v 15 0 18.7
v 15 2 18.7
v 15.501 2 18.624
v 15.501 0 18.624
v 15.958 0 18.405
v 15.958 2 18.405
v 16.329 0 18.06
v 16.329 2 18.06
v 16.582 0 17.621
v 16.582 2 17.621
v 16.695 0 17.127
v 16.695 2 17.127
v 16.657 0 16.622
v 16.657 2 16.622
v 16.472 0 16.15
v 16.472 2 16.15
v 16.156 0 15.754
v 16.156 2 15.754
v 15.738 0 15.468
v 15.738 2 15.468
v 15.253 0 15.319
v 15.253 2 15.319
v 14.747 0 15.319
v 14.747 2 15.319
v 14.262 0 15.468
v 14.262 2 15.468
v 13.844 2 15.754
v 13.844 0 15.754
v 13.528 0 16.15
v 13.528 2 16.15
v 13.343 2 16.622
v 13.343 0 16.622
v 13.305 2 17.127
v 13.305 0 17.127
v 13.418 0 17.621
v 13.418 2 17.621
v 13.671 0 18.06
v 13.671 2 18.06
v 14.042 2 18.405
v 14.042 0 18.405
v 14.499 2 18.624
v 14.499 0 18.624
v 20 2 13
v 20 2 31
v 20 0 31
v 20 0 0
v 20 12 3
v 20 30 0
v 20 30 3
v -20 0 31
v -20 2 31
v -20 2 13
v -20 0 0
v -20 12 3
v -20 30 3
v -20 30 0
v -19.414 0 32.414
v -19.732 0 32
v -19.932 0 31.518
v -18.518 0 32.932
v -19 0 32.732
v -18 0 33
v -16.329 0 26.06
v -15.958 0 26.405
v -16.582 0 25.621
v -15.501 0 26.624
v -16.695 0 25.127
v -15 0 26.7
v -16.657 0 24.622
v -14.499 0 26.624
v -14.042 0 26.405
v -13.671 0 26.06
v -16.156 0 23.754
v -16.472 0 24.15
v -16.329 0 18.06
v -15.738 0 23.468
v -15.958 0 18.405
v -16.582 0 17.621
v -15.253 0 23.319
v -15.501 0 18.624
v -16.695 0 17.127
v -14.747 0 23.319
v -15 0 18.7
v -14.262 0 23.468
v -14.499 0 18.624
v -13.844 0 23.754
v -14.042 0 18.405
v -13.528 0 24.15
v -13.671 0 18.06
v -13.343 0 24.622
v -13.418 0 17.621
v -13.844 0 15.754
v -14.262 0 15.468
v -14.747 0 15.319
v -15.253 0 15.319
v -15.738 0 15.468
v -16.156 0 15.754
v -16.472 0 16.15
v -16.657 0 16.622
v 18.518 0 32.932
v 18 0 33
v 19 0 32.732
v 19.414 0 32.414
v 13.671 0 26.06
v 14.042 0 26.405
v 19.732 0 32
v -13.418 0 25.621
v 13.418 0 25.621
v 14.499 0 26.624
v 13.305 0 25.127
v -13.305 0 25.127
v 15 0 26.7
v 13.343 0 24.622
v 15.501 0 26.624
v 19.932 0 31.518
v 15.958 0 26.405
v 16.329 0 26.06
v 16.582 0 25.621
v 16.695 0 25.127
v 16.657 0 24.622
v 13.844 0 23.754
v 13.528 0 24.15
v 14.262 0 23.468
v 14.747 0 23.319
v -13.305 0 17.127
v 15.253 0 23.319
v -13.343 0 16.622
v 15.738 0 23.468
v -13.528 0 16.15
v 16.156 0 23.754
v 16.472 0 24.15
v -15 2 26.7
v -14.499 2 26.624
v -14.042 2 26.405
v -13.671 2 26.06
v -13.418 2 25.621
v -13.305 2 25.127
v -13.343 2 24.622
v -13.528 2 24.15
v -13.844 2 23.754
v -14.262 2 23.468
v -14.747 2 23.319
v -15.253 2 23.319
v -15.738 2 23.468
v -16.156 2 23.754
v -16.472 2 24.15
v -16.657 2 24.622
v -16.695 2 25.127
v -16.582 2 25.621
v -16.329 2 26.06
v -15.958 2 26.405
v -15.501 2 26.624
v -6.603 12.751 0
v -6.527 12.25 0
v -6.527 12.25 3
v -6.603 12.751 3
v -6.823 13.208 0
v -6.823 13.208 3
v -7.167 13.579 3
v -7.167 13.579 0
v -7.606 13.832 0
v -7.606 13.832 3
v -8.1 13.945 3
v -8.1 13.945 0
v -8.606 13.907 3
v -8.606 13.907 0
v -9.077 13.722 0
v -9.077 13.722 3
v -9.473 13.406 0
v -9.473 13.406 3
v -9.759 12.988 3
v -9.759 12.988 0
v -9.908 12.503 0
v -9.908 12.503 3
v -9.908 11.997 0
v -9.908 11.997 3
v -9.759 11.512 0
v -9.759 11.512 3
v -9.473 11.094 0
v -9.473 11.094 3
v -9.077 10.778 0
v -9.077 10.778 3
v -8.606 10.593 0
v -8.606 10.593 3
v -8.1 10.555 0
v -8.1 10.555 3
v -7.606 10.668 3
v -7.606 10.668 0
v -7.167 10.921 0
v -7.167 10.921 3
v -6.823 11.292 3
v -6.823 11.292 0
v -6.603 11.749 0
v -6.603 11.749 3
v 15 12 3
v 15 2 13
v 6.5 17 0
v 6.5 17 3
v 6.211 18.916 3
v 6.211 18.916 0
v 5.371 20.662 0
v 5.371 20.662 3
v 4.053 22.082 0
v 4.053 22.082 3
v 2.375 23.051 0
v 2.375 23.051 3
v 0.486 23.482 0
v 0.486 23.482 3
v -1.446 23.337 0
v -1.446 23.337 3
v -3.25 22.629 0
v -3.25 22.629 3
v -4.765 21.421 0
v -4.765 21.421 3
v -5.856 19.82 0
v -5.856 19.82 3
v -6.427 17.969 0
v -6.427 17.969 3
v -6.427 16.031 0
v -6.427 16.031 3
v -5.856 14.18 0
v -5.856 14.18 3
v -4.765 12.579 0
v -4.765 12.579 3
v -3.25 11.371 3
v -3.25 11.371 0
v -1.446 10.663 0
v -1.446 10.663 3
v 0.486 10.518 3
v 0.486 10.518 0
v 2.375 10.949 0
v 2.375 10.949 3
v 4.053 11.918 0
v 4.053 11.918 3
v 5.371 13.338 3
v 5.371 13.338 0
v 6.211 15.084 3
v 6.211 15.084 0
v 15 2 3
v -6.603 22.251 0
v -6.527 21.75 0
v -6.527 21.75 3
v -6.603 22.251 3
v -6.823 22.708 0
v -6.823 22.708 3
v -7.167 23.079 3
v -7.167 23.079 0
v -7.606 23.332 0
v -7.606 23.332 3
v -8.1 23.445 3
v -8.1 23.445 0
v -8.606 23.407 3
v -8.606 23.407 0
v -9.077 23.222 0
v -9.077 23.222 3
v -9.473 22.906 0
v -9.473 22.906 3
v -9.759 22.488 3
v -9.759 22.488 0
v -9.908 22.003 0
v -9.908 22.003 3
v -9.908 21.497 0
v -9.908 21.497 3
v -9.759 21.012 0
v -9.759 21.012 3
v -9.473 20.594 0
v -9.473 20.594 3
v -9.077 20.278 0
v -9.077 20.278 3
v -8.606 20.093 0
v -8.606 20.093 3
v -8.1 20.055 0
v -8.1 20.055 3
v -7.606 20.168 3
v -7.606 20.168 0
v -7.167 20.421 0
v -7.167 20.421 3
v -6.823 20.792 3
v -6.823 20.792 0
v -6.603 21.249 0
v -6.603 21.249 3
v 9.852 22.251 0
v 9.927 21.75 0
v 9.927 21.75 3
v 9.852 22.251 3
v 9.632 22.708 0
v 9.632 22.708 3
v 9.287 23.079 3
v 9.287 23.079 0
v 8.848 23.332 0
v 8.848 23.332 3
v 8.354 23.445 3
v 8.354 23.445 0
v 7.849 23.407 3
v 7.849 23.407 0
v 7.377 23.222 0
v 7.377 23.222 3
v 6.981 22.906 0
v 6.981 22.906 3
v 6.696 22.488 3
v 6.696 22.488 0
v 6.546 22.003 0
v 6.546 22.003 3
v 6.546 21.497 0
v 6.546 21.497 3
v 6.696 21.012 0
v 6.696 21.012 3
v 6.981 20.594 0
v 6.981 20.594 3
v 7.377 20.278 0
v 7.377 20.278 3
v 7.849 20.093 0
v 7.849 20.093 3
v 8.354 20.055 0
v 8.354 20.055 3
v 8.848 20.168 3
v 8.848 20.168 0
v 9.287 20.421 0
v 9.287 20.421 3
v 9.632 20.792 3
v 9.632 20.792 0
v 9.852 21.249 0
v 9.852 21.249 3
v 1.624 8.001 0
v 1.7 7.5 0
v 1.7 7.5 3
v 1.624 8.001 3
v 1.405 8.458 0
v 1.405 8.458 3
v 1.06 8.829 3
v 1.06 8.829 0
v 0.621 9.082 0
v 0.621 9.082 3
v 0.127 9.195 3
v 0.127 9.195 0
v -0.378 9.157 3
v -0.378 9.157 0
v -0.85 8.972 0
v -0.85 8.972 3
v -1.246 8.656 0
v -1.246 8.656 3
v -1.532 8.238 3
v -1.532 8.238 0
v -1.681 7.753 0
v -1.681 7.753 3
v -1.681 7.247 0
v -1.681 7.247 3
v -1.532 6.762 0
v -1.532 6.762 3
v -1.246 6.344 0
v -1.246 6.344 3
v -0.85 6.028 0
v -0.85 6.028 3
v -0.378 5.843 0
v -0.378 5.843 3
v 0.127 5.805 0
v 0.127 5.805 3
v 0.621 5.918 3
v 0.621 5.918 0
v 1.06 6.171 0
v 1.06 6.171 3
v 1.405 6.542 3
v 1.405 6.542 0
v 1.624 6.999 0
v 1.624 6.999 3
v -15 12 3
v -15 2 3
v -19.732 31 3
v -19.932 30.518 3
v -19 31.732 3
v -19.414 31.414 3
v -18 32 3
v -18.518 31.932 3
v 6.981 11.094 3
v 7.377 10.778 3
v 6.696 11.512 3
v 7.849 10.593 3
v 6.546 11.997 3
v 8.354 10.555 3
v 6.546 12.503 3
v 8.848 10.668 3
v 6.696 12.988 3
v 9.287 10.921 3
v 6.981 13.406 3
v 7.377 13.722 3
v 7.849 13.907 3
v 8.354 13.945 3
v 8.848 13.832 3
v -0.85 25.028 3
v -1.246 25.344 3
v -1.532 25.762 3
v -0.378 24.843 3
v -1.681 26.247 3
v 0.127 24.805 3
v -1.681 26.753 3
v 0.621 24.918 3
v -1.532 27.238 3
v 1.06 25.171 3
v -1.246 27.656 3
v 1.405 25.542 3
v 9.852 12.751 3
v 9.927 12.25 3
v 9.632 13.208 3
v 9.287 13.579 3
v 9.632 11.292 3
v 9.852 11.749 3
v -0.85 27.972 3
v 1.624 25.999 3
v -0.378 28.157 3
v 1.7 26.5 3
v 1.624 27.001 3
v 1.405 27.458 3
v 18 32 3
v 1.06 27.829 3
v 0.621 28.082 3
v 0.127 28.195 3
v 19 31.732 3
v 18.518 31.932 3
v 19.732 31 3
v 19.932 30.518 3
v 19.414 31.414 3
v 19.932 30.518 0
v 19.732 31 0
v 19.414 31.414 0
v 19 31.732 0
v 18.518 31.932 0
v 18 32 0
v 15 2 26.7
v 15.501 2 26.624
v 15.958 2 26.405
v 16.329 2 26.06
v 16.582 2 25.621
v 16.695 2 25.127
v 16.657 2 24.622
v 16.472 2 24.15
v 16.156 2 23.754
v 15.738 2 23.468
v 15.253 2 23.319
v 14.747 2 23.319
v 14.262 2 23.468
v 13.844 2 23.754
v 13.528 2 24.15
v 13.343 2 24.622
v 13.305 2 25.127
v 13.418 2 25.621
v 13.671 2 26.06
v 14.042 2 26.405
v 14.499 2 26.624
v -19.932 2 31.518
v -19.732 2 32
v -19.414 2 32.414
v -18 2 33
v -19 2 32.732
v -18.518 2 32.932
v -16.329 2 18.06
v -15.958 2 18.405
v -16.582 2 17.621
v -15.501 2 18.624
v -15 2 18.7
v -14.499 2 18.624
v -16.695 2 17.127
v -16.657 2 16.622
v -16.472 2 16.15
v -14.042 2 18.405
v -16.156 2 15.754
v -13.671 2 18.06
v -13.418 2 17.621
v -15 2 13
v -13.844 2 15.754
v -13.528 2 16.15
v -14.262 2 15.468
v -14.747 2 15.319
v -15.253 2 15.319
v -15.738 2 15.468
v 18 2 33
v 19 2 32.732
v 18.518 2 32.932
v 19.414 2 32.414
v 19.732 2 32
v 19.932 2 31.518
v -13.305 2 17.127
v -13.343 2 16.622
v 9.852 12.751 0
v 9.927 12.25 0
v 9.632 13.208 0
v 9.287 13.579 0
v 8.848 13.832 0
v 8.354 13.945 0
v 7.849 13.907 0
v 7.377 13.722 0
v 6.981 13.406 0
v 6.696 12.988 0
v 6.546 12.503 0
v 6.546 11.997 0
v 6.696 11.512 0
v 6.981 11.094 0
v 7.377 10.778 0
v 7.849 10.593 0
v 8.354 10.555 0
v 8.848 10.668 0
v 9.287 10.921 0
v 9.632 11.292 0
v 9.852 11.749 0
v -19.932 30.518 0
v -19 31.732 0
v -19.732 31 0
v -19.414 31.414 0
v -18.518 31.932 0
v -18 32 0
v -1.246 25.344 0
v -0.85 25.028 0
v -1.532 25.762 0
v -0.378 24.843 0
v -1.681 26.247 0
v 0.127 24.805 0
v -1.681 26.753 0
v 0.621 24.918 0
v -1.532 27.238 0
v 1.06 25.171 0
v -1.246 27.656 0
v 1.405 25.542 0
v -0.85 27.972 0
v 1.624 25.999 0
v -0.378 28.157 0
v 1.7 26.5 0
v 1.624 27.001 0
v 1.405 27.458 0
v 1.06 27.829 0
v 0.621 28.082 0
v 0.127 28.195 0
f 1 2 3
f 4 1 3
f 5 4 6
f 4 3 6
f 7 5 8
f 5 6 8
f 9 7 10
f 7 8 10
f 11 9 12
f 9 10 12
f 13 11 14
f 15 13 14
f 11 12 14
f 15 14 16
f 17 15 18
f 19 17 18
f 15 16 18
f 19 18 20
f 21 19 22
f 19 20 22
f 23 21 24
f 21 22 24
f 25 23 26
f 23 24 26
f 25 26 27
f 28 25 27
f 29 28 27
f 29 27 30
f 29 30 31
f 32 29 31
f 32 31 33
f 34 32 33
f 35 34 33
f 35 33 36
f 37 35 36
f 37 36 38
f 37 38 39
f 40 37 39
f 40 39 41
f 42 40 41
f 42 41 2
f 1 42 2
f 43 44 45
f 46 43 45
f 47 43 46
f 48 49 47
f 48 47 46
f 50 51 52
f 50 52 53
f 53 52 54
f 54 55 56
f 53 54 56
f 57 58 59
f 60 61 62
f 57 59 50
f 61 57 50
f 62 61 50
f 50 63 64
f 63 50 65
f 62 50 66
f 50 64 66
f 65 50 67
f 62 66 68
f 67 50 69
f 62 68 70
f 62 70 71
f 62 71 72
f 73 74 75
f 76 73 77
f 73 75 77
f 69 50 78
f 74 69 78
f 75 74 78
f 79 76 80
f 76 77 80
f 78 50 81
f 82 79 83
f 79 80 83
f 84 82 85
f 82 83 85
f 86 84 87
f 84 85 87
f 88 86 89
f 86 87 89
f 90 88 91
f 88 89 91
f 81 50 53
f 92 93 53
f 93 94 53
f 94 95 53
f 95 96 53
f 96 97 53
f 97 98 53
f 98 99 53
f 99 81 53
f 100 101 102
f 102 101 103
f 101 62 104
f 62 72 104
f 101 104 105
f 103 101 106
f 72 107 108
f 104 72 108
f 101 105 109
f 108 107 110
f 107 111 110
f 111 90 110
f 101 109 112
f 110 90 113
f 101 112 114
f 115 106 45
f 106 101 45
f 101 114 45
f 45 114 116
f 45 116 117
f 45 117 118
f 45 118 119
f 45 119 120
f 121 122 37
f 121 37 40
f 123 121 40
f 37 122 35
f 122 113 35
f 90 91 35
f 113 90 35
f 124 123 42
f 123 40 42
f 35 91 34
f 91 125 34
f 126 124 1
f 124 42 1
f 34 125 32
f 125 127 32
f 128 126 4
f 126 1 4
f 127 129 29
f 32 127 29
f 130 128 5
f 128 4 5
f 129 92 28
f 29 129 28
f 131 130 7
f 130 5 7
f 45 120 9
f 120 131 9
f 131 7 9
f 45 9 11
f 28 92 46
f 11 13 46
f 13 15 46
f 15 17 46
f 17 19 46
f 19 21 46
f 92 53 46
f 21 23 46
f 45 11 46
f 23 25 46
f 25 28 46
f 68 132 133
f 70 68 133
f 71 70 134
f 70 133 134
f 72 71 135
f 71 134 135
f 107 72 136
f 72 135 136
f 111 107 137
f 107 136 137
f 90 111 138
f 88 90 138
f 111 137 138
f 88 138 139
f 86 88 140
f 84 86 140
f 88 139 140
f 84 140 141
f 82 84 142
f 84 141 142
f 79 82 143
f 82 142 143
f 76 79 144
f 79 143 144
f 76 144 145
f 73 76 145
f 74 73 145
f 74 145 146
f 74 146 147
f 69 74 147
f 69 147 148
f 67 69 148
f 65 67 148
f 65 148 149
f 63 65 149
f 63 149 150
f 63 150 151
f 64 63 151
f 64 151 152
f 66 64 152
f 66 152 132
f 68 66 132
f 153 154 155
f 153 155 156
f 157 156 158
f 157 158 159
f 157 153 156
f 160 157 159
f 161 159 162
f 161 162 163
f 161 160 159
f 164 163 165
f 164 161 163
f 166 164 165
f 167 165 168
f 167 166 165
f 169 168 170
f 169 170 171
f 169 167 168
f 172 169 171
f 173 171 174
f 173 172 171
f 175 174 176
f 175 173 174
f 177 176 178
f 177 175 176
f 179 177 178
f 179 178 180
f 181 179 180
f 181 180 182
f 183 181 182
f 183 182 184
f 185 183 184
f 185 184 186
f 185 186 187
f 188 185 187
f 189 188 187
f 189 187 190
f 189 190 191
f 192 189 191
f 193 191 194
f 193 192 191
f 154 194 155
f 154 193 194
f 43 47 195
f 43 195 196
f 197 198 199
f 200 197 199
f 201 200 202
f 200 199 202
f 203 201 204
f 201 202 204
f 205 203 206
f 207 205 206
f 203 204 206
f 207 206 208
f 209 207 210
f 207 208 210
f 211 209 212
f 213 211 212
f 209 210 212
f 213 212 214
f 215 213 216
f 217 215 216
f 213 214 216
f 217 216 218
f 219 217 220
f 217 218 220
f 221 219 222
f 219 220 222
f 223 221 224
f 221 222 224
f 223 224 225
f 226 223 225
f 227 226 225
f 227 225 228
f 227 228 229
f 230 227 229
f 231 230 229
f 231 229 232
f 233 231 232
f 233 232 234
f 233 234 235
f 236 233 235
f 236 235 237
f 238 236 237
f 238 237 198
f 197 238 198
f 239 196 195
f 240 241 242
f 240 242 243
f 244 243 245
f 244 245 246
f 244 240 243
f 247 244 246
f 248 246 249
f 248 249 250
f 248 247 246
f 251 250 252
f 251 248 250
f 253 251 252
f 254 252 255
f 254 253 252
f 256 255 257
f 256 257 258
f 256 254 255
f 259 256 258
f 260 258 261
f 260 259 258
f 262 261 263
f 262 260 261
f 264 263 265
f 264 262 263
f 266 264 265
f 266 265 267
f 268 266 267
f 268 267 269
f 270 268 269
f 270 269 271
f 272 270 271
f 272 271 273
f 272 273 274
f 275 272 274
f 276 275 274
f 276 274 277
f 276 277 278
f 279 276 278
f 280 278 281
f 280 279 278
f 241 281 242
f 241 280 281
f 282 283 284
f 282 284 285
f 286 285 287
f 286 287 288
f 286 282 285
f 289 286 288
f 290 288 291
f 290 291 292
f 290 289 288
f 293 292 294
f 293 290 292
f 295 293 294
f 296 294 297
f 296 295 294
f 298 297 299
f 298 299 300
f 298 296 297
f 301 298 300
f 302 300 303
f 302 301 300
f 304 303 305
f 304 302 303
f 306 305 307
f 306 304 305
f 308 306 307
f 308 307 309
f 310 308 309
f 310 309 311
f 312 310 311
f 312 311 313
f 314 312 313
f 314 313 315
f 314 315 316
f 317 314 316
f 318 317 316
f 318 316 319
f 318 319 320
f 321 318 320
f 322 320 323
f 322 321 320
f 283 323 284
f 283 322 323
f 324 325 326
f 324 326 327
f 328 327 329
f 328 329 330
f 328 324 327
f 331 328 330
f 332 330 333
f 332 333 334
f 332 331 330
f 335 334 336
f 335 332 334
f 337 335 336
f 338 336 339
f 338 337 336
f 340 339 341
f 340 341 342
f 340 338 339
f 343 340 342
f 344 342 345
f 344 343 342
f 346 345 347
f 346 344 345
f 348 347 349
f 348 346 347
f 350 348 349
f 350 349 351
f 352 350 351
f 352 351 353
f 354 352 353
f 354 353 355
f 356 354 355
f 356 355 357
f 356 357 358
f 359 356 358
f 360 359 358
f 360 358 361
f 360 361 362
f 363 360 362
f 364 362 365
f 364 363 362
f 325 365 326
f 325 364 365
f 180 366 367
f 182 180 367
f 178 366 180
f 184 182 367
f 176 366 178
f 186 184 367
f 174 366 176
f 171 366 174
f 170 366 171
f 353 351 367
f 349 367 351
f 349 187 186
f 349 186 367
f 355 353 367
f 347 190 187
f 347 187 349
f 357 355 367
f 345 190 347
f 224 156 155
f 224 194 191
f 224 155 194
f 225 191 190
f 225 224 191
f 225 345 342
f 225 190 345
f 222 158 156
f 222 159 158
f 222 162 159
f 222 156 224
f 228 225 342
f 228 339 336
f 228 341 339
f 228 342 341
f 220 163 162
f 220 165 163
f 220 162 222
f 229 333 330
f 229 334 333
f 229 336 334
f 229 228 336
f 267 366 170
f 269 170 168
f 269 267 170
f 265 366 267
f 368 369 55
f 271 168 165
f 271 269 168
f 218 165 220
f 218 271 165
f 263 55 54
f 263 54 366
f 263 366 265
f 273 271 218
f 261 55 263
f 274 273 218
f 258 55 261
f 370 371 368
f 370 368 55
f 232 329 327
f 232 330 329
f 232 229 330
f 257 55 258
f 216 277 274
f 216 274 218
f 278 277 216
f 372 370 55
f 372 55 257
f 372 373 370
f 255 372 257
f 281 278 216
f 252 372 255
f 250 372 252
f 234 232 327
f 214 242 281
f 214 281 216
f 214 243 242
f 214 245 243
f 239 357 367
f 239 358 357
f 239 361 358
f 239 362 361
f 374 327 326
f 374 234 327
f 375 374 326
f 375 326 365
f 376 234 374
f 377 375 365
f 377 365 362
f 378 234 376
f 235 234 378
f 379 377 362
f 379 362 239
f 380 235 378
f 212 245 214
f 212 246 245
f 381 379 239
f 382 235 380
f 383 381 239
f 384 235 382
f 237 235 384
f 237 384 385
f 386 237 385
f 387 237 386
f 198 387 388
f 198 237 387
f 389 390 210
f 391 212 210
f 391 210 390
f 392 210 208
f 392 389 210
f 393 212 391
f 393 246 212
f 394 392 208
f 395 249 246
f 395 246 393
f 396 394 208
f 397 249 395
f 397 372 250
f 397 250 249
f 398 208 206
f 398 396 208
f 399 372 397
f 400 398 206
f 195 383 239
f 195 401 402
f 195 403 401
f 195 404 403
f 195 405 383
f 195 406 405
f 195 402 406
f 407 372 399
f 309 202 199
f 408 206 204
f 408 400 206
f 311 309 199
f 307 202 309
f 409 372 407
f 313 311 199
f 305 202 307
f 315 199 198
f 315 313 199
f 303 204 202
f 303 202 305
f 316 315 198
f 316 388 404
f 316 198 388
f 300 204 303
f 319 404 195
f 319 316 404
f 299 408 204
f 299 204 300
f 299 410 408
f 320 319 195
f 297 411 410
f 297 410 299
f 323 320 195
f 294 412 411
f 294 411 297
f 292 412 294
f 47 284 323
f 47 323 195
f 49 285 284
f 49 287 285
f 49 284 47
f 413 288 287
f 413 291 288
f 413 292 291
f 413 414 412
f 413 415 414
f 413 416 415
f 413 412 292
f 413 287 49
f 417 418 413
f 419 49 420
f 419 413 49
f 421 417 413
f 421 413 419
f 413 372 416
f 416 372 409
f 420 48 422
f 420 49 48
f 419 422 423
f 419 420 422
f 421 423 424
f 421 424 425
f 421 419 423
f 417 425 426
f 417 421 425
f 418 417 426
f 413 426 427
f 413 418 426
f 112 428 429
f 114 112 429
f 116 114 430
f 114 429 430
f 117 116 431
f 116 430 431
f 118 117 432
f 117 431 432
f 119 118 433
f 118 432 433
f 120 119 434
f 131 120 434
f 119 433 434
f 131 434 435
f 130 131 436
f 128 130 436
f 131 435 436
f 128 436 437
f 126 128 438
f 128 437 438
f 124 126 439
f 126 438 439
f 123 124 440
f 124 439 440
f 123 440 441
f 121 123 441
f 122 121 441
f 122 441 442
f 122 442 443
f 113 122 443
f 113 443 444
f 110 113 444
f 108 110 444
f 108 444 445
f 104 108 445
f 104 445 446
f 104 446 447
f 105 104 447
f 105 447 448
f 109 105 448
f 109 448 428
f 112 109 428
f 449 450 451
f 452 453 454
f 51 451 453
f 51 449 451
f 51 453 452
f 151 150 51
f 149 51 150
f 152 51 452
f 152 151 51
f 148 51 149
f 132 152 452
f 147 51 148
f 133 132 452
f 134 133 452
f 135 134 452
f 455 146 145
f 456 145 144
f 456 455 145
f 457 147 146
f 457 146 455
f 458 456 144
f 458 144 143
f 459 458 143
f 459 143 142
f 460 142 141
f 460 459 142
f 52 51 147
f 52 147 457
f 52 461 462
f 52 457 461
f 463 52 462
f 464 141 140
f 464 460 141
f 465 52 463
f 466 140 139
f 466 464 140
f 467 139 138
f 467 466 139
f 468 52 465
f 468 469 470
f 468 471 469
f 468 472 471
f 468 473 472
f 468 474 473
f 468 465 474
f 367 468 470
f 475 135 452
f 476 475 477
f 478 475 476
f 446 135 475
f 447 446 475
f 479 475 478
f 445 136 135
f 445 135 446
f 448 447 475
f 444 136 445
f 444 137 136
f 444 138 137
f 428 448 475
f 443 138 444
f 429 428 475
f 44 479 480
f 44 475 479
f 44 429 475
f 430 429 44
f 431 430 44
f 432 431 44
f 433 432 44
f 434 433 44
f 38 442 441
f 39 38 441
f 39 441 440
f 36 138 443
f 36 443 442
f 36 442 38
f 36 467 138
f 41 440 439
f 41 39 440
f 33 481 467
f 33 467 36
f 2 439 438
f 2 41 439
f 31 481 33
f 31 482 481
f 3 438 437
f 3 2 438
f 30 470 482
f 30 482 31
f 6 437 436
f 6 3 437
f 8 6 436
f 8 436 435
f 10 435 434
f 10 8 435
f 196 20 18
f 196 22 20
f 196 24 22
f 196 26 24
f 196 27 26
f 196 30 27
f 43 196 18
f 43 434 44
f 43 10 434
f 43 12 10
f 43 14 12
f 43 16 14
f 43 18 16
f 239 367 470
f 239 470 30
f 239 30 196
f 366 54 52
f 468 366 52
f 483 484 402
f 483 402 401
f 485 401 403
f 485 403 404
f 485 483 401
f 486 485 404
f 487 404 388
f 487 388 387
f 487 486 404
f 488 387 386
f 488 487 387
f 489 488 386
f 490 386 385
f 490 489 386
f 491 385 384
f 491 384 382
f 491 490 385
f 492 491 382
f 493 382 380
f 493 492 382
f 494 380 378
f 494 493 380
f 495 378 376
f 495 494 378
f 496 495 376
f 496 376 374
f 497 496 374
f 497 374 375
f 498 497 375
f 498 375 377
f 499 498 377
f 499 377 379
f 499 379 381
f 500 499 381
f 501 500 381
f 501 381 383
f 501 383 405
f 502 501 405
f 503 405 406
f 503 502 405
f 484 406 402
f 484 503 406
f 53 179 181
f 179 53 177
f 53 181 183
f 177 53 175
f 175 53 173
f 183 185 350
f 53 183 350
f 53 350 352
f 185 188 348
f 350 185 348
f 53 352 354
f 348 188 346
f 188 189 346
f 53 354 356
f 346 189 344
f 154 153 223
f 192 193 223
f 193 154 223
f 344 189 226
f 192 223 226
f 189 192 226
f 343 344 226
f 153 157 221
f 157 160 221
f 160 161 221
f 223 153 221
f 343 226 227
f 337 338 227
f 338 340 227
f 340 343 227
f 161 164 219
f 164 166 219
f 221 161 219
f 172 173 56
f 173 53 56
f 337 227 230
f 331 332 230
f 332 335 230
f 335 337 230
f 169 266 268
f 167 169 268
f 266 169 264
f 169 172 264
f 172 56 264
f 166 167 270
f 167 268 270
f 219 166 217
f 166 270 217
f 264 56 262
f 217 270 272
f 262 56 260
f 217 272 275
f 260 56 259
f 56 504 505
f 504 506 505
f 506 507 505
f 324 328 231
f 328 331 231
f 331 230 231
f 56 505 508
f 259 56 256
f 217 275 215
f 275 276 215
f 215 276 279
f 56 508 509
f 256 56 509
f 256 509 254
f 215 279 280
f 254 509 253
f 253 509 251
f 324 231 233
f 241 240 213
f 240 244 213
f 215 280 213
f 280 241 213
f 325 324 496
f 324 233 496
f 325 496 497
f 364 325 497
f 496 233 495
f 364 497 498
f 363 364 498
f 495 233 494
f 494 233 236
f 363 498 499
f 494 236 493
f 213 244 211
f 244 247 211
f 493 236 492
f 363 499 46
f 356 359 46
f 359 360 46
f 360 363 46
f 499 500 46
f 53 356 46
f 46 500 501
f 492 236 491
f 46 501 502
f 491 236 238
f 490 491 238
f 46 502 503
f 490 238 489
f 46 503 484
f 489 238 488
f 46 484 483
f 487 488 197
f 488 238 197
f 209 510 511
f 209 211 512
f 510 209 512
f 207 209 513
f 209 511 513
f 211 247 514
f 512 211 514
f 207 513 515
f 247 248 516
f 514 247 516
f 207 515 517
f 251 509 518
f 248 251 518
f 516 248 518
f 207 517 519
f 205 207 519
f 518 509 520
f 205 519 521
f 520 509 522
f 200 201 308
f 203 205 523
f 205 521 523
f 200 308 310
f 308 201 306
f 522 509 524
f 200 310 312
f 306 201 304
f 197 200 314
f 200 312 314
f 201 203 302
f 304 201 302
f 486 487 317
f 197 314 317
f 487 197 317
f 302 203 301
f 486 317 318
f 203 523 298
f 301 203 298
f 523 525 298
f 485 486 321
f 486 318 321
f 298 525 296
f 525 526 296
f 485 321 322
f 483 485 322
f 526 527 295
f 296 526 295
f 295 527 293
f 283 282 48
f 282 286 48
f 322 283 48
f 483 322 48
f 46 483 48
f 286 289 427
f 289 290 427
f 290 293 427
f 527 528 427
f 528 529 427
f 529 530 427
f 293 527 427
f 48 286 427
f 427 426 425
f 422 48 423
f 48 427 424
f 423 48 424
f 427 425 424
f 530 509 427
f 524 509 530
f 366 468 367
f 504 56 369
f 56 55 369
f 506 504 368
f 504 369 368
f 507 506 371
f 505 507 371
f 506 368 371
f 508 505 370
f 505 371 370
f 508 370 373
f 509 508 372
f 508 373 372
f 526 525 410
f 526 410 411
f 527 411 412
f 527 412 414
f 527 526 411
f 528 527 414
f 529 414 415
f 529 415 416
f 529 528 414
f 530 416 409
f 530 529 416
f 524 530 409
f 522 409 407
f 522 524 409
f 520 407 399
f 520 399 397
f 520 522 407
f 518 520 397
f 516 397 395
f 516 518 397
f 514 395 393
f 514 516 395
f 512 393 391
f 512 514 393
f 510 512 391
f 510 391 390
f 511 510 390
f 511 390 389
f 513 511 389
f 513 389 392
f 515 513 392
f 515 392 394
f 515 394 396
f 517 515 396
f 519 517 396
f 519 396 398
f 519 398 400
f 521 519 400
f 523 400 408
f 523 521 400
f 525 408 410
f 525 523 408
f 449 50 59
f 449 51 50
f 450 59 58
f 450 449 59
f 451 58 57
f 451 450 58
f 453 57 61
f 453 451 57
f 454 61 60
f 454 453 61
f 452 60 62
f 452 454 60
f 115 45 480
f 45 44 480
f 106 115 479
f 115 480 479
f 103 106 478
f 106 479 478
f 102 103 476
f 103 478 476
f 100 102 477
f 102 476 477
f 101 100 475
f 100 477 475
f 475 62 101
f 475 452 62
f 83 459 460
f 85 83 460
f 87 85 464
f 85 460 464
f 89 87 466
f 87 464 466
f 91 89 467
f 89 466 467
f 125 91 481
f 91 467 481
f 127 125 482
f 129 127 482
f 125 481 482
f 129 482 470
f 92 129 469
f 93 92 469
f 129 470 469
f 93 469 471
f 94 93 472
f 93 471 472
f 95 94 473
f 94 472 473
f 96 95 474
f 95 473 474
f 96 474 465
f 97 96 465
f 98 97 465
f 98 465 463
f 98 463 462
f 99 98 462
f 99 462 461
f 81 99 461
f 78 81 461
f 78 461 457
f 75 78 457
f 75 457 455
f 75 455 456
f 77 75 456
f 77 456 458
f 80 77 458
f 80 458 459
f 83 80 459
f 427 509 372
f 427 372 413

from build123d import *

# Parameters (mm, degrees)
SKETCH_2_W          = 40
SKETCH_2_H          = 32
SKETCH_2_R          = 1.7
EXTRUDE_2_DEPTH     = 3
CUT_EXTRUDE_1_REACH = 39.855
SKETCH_3_R          = 6.5
SKETCH_4_W          = 40
SKETCH_4_H          = 2
EXTRUDE_3_DEPTH     = 30
EXTRUDE_4_DEPTH     = 5
FILLET_1_R          = 2
SKETCH_6_R          = 1.7
CUT_EXTRUDE_2_DEPTH = 10


with BuildPart() as part:
    # 草图2 → 凸台-拉伸2 (new body)
    with BuildSketch(Plane.XY):
        with Locations((0, 16)):
            Rectangle(SKETCH_2_W, SKETCH_2_H)
        with Locations((0, 26.5)):
            Circle(SKETCH_2_R, mode=Mode.SUBTRACT)
        with Locations((8.227241336, 21.75)):
            Circle(SKETCH_2_R, mode=Mode.SUBTRACT)
        with Locations((8.227241336, 12.25)):
            Circle(SKETCH_2_R, mode=Mode.SUBTRACT)
        with Locations((0, 7.5)):
            Circle(SKETCH_2_R, mode=Mode.SUBTRACT)
        with Locations((-8.227241336, 12.25)):
            Circle(SKETCH_2_R, mode=Mode.SUBTRACT)
        with Locations((-8.227241336, 21.75)):
            Circle(SKETCH_2_R, mode=Mode.SUBTRACT)
    extrude(amount=EXTRUDE_2_DEPTH)

    # 草图3 → 切除-拉伸1 (cut, up to next)
    with BuildSketch(Plane.XY.offset(3), mode=Mode.PRIVATE) as cut_extrude_1_sk1:
        with Locations((0, 17)):
            Circle(SKETCH_3_R)
    cut_extrude_1_tool1 = extrude(cut_extrude_1_sk1.sketch, amount=-CUT_EXTRUDE_1_REACH, mode=Mode.PRIVATE) & part.part
    add(cut_extrude_1_tool1.solids().sort_by_distance((0, 17, 3))[0], mode=Mode.SUBTRACT)

    # 草图4 → 凸台-拉伸3 (add)
    with BuildSketch(Plane.XY.offset(3)):
        with Locations((0, 1)):
            Rectangle(SKETCH_4_W, SKETCH_4_H)
    extrude(amount=EXTRUDE_3_DEPTH)

    # 草图5 → 凸台-拉伸4 (add)
    with BuildSketch(Plane.ZY.offset(20)):
        Polygon((3, 12), (13, 2), (3, 2), align=None)
    extrude_4 = extrude(amount=-EXTRUDE_4_DEPTH)

    # 镜向1: 凸台-拉伸4 across plane
    add(extrude_4.mirror(Plane(origin=(0, 0, 0), x_dir=(0, 0, 1), z_dir=(1, 0, 0))))

    # 圆角1
    fillet_1_edges = [part.edges().sort_by_distance(p)[0] for p in [
        (-20, 1, 33),
        (20, 1, 33),
        (-20, 32, 1.5),
        (20, 32, 1.5),
    ]]
    fillet(fillet_1_edges, radius=FILLET_1_R)

    # 草图6 → 切除-拉伸2 (cut)
    with BuildSketch(Plane(origin=(0, 2, 0), x_dir=(1, 0, 0), z_dir=(0, 1, 0))):
        with Locations(Location((-15, -17, 0), (0, 0, 270))):
            Circle(SKETCH_6_R)
        with Locations(Location((15, -17, 0), (0, 0, 270))):
            Circle(SKETCH_6_R)
        with Locations(Location((-15, -25, 0), (0, 0, 270))):
            Circle(SKETCH_6_R)
        with Locations(Location((15, -25, 0), (0, 0, 270))):
            Circle(SKETCH_6_R)
    extrude(amount=-CUT_EXTRUDE_2_DEPTH, mode=Mode.SUBTRACT)


solid = part.part
